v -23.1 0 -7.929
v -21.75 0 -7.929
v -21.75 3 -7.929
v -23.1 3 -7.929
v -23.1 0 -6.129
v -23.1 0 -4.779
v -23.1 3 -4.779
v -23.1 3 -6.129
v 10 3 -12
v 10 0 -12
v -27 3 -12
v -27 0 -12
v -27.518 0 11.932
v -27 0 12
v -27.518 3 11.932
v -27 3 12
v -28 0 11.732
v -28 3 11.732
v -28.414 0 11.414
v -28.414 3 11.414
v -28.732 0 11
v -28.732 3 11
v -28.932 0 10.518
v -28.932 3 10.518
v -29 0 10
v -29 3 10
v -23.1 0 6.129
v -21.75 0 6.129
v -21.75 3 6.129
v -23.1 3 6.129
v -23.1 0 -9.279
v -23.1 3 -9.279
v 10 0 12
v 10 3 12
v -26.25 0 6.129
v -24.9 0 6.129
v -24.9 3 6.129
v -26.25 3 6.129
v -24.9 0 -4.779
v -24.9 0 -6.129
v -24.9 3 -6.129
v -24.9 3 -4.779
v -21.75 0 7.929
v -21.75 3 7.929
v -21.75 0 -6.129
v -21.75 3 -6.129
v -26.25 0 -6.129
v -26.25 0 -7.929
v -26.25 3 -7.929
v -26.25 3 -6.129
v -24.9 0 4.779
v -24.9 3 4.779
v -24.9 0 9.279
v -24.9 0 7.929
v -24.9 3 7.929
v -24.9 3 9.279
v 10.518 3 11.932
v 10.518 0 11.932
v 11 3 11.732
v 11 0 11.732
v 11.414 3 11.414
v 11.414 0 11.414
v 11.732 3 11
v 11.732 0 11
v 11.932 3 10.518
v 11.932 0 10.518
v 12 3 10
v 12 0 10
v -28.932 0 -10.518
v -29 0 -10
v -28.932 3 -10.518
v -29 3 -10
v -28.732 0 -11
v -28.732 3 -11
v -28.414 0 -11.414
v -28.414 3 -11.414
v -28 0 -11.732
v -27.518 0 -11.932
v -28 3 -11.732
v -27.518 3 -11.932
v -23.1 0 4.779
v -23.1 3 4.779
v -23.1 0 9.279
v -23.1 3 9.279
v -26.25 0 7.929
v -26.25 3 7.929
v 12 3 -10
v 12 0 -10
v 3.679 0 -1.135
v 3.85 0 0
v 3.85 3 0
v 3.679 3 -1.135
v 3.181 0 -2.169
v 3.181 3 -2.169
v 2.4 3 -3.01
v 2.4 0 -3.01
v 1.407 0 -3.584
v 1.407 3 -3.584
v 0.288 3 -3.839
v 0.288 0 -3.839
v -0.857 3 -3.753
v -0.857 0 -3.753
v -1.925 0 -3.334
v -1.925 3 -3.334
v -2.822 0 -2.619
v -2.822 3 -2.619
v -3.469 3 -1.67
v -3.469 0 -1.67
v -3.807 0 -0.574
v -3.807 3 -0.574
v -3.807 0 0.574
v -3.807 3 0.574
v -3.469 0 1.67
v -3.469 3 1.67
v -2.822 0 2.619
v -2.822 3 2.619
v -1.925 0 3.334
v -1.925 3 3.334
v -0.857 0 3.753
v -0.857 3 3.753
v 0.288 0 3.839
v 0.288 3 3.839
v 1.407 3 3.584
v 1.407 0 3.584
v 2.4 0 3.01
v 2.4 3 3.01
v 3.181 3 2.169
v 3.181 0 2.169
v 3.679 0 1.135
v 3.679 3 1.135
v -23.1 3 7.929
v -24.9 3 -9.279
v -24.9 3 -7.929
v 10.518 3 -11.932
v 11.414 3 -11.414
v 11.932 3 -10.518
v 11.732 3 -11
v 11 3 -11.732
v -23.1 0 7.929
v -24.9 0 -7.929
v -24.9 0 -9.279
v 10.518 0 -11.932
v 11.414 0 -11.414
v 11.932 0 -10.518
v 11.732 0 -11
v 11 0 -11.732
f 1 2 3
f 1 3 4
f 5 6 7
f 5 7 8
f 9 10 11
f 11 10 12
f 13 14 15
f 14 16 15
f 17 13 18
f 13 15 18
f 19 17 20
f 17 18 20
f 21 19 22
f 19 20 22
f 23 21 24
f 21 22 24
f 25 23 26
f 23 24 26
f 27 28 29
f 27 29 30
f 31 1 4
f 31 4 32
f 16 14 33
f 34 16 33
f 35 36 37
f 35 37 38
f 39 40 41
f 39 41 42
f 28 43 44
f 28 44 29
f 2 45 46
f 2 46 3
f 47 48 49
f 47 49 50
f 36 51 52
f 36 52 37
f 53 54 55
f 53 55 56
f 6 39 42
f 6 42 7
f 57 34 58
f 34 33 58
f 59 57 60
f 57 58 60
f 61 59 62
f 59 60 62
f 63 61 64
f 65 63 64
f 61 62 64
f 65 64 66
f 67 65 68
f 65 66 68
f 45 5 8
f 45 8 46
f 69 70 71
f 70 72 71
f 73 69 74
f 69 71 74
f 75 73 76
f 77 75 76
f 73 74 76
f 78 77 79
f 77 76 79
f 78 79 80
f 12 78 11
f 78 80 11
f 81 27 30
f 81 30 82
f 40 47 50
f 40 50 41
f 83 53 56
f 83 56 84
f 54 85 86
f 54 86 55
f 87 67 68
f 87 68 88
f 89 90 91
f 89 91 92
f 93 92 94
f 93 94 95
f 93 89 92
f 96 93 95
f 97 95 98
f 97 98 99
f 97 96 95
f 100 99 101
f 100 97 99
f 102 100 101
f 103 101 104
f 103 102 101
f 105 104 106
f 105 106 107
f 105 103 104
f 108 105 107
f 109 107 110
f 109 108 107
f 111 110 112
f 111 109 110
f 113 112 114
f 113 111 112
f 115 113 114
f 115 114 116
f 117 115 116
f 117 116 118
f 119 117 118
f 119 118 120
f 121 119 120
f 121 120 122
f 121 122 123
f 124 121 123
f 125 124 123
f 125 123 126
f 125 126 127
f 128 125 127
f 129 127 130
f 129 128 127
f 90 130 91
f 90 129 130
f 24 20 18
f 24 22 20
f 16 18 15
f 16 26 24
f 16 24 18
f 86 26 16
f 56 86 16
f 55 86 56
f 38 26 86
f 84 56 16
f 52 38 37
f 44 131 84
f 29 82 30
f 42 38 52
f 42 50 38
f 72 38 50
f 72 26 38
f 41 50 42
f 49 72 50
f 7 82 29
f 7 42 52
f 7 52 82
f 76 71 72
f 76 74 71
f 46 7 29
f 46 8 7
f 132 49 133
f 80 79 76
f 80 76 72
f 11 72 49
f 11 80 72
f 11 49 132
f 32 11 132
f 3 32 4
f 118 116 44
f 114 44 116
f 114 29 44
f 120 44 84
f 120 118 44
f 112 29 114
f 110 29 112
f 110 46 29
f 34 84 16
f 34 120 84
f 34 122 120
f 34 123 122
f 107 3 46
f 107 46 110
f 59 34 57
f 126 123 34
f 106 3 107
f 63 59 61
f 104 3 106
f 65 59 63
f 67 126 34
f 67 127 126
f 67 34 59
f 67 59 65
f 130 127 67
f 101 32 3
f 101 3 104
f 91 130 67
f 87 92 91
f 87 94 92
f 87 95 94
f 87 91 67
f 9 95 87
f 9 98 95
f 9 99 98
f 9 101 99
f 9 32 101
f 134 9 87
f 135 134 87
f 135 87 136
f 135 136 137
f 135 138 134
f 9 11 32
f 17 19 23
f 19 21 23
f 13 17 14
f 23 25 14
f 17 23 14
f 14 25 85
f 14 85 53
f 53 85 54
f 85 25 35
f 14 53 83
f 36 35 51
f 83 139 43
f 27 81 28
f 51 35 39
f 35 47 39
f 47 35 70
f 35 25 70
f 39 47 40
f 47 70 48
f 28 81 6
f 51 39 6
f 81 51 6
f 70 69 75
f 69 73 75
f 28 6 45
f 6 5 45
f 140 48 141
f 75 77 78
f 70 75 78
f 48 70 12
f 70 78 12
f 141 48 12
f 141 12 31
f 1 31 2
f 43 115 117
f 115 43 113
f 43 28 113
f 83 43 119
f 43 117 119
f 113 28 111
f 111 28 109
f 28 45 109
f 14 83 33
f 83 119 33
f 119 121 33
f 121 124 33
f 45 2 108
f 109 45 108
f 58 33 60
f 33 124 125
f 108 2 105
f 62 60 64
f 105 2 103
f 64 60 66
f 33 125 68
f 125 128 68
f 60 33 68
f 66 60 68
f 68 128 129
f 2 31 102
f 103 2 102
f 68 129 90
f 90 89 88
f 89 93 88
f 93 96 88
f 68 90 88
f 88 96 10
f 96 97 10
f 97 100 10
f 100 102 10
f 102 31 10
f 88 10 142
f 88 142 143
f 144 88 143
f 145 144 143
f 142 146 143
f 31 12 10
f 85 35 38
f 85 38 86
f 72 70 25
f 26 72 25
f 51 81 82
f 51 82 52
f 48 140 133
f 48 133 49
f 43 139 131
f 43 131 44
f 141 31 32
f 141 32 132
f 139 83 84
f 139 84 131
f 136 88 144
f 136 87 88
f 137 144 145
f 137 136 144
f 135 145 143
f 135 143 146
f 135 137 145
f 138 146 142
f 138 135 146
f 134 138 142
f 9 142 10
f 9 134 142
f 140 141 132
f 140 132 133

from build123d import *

# Parameters (mm, degrees)
SKETCH1_R           = 3.85
SKETCH1_R_2         = 2.25
BOSS_EXTRUDE1_DEPTH = 3
FILLET1_R           = 2
SKETCH2_W           = 35.37250713
SKETCH2_H           = 42.722638482
CUT_EXTRUDE1_DEPTH  = 10
FILLET2_R           = 2


with BuildPart() as part:
    # Sketch1 → Boss-Extrude1 (new body)
    with BuildSketch(Plane(origin=(0, 0, 0), x_dir=(1, 0, 0), z_dir=(0, 1, 0))):
        Polygon((-29, -12), (29, -12), (29, -6), (21.6, -6), (21.6, 6), (29, 6), (29, 12), (-29, 12), align=None)
        Circle(SKETCH1_R, mode=Mode.SUBTRACT)
        with Locations((23.8, 9)):
            Circle(SKETCH1_R_2, mode=Mode.SUBTRACT)
        with Locations((23.8, -9)):
            Circle(SKETCH1_R_2, mode=Mode.SUBTRACT)
        Polygon((-21.75, -6.129437252), (-23.1, -6.129437252), (-23.1, -4.779437252), (-24.9, -4.779437252), (-24.9, -6.129437252), (-26.25, -6.129437252), (-26.25, -7.929437252), (-24.9, -7.929437252), (-24.9, -9.279437252), (-23.1, -9.279437252), (-23.1, -7.929437252), (-21.75, -7.929437252), align=None, mode=Mode.SUBTRACT)
        Polygon((-23.1, 6.129437252), (-21.75, 6.129437252), (-21.75, 7.929437252), (-23.1, 7.929437252), (-23.1, 9.279437252), (-24.9, 9.279437252), (-24.9, 7.929437252), (-26.25, 7.929437252), (-26.25, 6.129437252), (-24.9, 6.129437252), (-24.9, 4.779437252), (-23.1, 4.779437252), align=None, mode=Mode.SUBTRACT)
    extrude(amount=BOSS_EXTRUDE1_DEPTH)

    # Fillet1
    fillet1_edges = [part.edges().sort_by_distance(p)[0] for p in [
        (29, 1.5, -6),
        (21.6, 1.5, -6),
        (21.6, 1.5, 6),
        (29, 1.5, 6),
        (29, 1.5, 12),
        (-29, 1.5, 12),
        (-29, 1.5, -12),
        (29, 1.5, -12),
    ]]
    fillet(fillet1_edges, radius=FILLET1_R)

    # Sketch2 → Cut-Extrude1 (cut)
    with BuildSketch(Plane(origin=(0, 3, 0), x_dir=(1, 0, 0), z_dir=(0, 1, 0))):
        with Locations((29.686253565, -0.298599086)):
            Rectangle(SKETCH2_W, SKETCH2_H)
    extrude(amount=-CUT_EXTRUDE1_DEPTH, mode=Mode.SUBTRACT)

    # Fillet2
    fillet2_edges = [part.edges().sort_by_distance(p)[0] for p in [
        (12, 1.5, 12),
        (12, 1.5, -12),
    ]]
    fillet(fillet2_edges, radius=FILLET2_R)


solid = part.part
